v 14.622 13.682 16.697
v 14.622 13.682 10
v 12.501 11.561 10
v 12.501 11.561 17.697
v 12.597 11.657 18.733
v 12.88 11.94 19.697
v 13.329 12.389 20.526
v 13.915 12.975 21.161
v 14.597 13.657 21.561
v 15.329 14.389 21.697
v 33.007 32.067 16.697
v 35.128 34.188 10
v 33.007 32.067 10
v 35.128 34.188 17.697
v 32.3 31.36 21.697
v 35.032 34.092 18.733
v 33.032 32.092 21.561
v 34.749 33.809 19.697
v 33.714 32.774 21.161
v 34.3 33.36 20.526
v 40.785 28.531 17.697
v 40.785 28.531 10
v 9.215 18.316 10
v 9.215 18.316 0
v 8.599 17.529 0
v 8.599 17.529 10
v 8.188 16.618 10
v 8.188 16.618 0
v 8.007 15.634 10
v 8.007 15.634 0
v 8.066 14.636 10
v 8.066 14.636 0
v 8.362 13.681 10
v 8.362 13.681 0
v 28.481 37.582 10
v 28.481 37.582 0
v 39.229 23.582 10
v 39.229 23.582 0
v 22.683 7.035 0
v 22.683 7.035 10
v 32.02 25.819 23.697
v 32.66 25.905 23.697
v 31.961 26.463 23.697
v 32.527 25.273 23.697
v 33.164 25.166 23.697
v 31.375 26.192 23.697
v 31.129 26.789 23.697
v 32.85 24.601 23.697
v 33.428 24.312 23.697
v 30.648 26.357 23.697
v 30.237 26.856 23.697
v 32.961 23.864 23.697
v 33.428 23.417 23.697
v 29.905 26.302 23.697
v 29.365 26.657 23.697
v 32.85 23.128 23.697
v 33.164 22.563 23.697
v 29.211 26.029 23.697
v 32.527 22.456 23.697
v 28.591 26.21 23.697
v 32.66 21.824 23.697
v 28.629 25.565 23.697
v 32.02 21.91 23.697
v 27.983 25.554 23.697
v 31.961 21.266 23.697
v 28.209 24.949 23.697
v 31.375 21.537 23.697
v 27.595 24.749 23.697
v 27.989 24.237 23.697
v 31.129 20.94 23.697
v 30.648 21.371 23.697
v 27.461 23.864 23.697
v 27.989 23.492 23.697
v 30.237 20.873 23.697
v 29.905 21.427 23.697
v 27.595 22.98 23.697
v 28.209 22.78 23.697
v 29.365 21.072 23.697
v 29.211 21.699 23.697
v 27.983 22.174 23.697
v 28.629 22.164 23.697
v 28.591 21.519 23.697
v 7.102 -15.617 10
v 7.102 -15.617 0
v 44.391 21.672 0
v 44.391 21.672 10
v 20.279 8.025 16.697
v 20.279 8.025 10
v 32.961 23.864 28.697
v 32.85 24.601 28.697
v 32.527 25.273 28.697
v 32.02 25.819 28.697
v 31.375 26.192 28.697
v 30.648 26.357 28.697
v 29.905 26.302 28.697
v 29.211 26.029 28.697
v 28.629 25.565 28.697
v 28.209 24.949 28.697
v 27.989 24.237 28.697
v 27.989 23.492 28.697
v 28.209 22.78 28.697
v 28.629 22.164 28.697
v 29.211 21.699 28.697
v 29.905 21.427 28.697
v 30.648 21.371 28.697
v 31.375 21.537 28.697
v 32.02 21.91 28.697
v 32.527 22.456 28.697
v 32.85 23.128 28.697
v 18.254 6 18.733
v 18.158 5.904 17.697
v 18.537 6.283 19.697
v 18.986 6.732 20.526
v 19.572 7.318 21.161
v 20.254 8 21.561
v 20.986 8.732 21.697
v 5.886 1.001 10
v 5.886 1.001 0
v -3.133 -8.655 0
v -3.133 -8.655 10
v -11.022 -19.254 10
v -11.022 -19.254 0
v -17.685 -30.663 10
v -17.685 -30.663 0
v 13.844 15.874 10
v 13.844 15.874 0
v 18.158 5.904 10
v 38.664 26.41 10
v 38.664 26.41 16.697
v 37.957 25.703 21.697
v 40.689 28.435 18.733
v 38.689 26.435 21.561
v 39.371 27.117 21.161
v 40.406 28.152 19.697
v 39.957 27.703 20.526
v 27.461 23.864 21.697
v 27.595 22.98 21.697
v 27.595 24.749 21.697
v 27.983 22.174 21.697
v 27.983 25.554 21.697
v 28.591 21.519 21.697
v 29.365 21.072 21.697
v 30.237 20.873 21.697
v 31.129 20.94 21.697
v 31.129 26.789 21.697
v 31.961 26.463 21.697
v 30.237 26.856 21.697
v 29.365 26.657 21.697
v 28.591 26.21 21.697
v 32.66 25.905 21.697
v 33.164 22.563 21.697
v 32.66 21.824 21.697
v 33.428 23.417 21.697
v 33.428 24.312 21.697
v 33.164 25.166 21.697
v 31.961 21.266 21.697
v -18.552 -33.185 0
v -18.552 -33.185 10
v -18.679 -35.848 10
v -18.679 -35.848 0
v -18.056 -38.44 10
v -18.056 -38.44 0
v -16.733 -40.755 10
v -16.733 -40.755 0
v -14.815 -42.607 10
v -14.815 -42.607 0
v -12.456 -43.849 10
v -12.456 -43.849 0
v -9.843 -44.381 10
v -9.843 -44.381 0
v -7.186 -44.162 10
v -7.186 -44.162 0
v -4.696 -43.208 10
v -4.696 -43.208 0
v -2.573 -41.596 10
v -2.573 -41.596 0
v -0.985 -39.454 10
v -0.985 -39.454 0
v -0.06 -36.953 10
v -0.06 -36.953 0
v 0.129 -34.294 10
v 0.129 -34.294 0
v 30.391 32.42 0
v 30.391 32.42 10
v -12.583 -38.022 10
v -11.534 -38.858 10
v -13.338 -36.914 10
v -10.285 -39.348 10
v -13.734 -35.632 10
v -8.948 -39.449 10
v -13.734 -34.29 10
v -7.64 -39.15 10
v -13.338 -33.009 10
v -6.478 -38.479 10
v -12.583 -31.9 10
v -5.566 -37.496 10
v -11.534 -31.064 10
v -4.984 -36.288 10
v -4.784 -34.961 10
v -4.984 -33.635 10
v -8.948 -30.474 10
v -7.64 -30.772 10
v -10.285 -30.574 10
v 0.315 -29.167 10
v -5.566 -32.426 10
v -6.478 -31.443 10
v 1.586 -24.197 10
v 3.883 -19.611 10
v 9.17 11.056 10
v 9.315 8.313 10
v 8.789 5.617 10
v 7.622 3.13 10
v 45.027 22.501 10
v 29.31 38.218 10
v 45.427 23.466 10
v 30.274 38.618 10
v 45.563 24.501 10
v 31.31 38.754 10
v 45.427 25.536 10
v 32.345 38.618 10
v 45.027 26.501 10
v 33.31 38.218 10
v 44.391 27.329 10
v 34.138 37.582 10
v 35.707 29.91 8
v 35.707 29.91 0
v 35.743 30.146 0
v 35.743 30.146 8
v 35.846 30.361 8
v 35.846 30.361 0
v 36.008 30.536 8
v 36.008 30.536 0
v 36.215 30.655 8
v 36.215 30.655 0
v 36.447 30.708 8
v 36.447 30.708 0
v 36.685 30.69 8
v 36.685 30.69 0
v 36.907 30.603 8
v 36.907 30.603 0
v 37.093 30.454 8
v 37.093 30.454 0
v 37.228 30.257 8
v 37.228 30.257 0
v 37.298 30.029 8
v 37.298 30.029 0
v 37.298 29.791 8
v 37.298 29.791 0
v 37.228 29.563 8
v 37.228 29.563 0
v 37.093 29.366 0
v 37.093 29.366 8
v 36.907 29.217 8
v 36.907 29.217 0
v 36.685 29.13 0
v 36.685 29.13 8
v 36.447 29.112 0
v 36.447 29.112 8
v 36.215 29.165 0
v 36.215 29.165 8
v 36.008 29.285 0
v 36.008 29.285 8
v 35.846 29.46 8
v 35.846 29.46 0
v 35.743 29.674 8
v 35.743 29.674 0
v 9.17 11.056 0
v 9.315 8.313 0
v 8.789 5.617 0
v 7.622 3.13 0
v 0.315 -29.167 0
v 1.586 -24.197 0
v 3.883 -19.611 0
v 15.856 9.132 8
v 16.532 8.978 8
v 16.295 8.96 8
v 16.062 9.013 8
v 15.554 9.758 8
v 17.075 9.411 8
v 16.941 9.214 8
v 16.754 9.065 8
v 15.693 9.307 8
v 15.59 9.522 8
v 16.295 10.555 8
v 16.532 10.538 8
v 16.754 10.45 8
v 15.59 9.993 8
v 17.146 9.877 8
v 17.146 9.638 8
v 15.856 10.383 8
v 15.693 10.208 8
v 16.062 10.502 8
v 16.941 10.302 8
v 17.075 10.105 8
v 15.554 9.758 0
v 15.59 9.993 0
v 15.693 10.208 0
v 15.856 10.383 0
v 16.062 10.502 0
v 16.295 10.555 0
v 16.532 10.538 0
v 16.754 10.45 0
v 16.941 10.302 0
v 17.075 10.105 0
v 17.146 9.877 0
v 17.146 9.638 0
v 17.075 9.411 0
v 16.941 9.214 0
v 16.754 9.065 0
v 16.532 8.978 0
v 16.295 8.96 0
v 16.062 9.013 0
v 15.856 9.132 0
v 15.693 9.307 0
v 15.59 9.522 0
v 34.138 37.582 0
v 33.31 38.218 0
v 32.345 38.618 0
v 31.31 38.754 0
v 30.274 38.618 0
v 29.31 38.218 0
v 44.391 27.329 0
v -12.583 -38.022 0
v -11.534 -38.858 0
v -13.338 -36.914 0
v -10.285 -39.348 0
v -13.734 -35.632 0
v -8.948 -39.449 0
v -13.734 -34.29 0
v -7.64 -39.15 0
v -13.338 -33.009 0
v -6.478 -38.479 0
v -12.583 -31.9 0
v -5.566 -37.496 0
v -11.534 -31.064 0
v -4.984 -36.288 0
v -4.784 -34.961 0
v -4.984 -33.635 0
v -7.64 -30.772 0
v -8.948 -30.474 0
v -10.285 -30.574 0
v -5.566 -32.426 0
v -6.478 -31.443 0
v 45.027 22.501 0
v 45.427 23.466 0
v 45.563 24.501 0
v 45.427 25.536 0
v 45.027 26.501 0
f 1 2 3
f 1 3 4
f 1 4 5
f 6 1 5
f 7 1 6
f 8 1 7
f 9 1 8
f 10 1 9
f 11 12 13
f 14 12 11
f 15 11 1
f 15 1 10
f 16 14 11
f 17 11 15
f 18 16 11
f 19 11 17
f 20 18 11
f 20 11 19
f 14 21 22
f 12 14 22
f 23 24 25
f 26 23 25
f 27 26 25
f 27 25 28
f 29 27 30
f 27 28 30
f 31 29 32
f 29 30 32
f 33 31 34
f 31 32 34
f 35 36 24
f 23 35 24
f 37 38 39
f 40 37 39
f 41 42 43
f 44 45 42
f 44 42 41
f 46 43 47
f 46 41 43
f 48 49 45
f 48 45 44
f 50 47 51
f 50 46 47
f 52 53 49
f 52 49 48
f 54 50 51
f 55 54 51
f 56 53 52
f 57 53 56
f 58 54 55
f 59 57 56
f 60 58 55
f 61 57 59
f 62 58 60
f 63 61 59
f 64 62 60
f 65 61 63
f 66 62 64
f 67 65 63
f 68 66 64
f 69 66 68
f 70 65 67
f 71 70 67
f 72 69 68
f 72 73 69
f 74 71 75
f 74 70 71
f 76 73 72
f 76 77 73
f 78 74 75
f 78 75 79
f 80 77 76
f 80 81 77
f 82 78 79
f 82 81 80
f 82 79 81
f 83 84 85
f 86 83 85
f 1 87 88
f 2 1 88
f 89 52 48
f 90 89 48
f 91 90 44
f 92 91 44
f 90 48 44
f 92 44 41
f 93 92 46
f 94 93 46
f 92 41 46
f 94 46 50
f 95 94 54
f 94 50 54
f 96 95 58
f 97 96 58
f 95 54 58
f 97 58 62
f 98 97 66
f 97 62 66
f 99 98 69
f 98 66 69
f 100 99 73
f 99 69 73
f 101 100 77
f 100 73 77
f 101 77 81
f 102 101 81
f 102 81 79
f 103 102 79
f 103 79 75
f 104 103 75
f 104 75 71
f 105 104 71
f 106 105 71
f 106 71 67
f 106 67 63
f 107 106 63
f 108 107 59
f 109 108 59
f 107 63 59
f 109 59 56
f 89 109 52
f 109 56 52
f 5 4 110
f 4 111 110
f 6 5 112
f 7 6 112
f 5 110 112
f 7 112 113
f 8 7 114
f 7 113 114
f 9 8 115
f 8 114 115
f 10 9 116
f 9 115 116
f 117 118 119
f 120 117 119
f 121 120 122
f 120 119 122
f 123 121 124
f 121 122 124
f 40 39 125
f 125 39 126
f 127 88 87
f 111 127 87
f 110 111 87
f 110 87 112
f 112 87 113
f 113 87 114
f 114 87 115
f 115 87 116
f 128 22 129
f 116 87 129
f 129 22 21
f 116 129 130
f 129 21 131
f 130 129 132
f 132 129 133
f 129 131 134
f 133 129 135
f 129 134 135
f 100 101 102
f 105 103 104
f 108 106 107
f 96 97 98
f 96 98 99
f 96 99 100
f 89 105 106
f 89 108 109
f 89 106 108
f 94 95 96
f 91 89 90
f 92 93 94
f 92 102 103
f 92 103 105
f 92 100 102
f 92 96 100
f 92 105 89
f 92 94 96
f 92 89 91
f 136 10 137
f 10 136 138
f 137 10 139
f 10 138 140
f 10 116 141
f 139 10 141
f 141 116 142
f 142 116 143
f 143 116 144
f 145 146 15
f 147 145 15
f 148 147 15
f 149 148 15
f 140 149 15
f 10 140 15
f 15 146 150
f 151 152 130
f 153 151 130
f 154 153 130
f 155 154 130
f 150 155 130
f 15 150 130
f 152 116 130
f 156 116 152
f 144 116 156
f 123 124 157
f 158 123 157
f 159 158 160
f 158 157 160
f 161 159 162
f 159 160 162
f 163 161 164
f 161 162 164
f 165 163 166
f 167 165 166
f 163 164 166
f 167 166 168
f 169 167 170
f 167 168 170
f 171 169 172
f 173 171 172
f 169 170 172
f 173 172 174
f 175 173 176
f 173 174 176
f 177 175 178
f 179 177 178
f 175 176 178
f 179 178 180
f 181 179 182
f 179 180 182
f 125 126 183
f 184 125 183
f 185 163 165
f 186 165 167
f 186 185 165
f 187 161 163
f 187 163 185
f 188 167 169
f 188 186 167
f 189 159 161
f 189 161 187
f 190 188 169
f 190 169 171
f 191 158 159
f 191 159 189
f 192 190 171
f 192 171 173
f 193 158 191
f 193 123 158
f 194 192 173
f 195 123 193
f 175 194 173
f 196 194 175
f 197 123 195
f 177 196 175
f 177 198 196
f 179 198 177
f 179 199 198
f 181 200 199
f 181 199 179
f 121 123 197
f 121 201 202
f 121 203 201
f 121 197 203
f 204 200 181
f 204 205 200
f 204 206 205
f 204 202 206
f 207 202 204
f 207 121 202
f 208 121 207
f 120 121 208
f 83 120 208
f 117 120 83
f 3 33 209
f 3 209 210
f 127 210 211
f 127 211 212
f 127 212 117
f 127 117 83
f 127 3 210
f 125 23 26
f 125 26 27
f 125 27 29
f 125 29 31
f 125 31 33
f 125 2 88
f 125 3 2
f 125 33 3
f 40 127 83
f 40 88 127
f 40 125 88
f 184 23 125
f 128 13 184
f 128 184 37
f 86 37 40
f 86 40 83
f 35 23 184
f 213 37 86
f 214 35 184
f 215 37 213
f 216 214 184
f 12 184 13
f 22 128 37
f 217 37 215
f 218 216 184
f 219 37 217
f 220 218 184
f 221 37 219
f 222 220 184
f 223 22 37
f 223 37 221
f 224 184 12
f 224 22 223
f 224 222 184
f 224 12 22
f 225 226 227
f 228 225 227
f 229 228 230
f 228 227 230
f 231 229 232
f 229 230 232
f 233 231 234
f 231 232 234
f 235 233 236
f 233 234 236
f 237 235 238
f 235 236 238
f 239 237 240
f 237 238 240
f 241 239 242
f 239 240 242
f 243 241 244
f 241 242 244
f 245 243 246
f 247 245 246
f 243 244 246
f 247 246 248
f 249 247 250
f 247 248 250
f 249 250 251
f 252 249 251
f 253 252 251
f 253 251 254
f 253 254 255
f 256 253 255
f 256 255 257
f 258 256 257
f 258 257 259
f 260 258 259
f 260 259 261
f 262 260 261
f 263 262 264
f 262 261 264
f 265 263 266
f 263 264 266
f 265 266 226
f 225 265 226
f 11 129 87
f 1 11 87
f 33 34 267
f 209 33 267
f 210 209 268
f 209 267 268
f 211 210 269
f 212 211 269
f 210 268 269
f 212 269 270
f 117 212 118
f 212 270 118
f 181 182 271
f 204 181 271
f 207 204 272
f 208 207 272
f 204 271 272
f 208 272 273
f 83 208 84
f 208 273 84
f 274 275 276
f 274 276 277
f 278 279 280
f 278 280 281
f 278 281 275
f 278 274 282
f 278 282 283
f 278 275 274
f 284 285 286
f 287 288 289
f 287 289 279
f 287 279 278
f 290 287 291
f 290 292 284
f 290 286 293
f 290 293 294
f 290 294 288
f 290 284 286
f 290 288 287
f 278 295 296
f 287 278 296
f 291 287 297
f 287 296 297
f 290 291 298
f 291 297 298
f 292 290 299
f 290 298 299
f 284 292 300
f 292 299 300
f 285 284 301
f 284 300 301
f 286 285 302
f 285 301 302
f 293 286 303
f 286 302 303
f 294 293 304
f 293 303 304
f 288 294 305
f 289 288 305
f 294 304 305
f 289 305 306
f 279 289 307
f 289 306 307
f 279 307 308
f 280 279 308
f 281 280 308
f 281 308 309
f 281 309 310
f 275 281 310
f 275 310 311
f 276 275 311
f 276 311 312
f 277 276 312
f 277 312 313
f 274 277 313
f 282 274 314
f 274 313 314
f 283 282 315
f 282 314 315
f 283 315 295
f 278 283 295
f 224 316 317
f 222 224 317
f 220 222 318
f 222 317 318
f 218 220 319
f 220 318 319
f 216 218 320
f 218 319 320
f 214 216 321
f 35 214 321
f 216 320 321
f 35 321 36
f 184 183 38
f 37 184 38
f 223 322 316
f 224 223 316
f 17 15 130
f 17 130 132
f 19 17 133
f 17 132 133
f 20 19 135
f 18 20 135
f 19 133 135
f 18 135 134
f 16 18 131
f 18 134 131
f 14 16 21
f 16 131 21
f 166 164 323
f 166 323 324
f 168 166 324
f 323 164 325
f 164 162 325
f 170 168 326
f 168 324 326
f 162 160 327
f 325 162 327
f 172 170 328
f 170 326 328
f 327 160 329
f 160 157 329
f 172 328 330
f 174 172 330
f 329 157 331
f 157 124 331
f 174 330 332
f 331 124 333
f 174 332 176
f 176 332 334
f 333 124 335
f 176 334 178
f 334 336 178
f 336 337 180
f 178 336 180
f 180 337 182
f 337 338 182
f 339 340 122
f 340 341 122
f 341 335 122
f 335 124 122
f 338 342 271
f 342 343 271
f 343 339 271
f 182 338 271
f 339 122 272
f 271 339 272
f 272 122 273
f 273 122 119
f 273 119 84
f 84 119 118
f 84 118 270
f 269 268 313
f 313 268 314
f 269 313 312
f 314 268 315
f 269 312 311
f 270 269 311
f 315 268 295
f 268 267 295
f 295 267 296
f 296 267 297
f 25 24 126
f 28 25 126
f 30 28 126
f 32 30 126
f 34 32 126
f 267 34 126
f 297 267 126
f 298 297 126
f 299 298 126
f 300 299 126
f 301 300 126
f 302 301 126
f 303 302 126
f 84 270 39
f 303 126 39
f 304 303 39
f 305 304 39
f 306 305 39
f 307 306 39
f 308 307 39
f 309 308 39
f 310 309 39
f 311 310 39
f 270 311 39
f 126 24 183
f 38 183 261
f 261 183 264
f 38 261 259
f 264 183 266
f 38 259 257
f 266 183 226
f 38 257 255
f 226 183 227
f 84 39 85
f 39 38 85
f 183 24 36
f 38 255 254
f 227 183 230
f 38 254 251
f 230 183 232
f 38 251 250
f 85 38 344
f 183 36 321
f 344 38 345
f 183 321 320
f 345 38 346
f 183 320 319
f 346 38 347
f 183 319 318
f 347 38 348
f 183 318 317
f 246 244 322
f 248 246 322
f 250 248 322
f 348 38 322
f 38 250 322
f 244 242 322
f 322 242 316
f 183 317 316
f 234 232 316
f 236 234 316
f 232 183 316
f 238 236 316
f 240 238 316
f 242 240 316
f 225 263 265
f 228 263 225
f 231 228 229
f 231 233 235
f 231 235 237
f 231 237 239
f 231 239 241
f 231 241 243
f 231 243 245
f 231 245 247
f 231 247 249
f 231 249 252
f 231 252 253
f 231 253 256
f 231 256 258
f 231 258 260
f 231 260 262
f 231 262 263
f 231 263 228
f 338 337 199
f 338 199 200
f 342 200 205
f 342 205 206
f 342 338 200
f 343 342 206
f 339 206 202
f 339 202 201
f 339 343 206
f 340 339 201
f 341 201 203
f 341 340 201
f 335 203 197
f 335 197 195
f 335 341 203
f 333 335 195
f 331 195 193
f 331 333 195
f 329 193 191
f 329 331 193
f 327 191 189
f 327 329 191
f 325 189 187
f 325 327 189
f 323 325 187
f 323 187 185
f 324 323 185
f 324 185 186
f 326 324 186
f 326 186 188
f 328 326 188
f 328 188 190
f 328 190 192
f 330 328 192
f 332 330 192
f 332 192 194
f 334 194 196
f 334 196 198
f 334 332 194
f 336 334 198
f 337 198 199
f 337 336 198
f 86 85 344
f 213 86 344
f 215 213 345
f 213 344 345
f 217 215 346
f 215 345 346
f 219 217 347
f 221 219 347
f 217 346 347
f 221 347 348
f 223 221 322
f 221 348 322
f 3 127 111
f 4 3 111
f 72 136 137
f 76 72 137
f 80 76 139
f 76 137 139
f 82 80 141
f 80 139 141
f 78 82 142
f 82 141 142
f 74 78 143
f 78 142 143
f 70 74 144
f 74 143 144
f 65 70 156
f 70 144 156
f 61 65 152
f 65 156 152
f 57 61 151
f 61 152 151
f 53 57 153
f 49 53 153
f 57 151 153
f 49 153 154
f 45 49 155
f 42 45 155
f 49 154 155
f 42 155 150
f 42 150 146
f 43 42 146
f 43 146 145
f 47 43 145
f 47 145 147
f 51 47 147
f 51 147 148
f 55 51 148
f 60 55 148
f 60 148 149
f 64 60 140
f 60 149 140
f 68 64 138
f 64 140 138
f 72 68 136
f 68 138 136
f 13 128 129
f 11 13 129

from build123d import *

# Parameters (mm, degrees)
SKETCH_2_R          = 4.5
EXTRUDE_1_DEPTH     = 10
EXTRUDE_2_DEPTH     = 4
SKETCH_12_R         = 0.8
CUT_EXTRUDE_2_DEPTH = 8
SKETCH_13_R         = 3
EXTRUDE_3_DEPTH     = 2
SKETCH_19_R         = 2.5
EXTRUDE_5_DEPTH     = 5


with BuildPart() as part:
    # 草图2 → 凸台-拉伸1 (new body)
    with BuildSketch(Plane.XY):
        with BuildLine():
            Line((7.102160211, -15.616687508), (44.391240582, 21.672392863))
            ThreePointArc((44.391240582, 21.672392863), (45.562813457, 24.500819988), (44.391240582, 27.329247112))
            Line((44.391240582, 27.329247112), (34.138192255, 37.58229544))
            ThreePointArc((34.138192255, 37.58229544), (31.30976513, 38.753868315), (28.481338005, 37.58229544))
            Line((28.481338005, 37.58229544), (9.215390399, 18.316347834))
            ThreePointArc((9.215390399, 18.316347834), (8.067593218, 16.131525495), (8.362136672, 13.681192624))
            ThreePointArc((8.362136672, 13.681192624), (9.134610316, 6.948541986), (5.886174479, 1.001024456))
            ThreePointArc((5.886174479, 1.001024456), (-7.225109998, -13.84439598), (-17.685225472, -30.663381468))
            ThreePointArc((-17.685225472, -30.663381468), (-11.168239652, -44.207967845), (0.129369861, -34.293788928))
            ThreePointArc((0.129369861, -34.293788928), (1.585802578, -24.197384934), (7.102160211, -15.616687508))
        make_face()
        with Locations((-9.283850525, -34.961173895)):
            Circle(SKETCH_2_R, mode=Mode.SUBTRACT)
        Polygon((39.229361079, 23.581581172), (22.6830624, 7.035282492), (13.844227635, 15.874117257), (30.390526315, 32.420415937), align=None, mode=Mode.SUBTRACT)
    extrude(amount=EXTRUDE_1_DEPTH)

    # 草图4 → 凸台-拉伸2 (add, symmetric)
    with BuildSketch(Plane(origin=(3.298406554, -3.298406554, 0), x_dir=(0, 0, -1), z_dir=(0.7071067811865492, -0.7071067811865458, 0))):
        with BuildLine():
            Line((-9.697397979, 20.014043199), (-9.697397979, 17.014043199))
            Line((-9.697397979, 17.014043199), (-17.697397979, 17.014043199))
            ThreePointArc((-17.697397979, 17.014043199), (-20.525825104, 18.185616074), (-21.697397979, 21.014043199))
            Line((-21.697397979, 21.014043199), (-21.697397979, 45.014043199))
            ThreePointArc((-21.697397979, 45.014043199), (-20.525825104, 47.842470323), (-17.697397979, 49.014043199))
            Line((-17.697397979, 49.014043199), (-9.697397979, 49.014043199))
            Line((-9.697397979, 49.014043199), (-9.697397979, 46.014043199))
            Line((-9.697397979, 46.014043199), (-16.697397979, 46.014043199))
            Line((-16.697397979, 46.014043199), (-16.697397979, 20.014043199))
            Line((-16.697397979, 20.014043199), (-9.697397979, 20.014043199))
        make_face()
    extrude(amount=EXTRUDE_2_DEPTH, both=True)

    # 草图12 → 切除-拉伸2 (cut)
    with BuildSketch(Plane(origin=(0, 0, 0), x_dir=(-1, 0, 0), z_dir=(0, 0, -1))):
        with Locations((-16.354456708, 9.7576436)):
            Circle(SKETCH_12_R)
        with Locations((-36.506999972, 29.910186864)):
            Circle(SKETCH_12_R)
    extrude(amount=-CUT_EXTRUDE_2_DEPTH, mode=Mode.SUBTRACT)

    # 草图13 → 凸台-拉伸3 (add)
    with BuildSketch(Plane.XY.offset(21.697397979)):
        with Locations(Location((30.461236993, 23.864423885, 0), (0, 0, 180))):
            Circle(SKETCH_13_R)
    extrude(amount=EXTRUDE_3_DEPTH)

    # 草图19 → 凸台-拉伸5 (add)
    with BuildSketch(Plane.XY.offset(23.697397979)):
        with Locations((30.461236993, 23.864423885)):
            Circle(SKETCH_19_R)
    extrude(amount=EXTRUDE_5_DEPTH)


solid = part.part
